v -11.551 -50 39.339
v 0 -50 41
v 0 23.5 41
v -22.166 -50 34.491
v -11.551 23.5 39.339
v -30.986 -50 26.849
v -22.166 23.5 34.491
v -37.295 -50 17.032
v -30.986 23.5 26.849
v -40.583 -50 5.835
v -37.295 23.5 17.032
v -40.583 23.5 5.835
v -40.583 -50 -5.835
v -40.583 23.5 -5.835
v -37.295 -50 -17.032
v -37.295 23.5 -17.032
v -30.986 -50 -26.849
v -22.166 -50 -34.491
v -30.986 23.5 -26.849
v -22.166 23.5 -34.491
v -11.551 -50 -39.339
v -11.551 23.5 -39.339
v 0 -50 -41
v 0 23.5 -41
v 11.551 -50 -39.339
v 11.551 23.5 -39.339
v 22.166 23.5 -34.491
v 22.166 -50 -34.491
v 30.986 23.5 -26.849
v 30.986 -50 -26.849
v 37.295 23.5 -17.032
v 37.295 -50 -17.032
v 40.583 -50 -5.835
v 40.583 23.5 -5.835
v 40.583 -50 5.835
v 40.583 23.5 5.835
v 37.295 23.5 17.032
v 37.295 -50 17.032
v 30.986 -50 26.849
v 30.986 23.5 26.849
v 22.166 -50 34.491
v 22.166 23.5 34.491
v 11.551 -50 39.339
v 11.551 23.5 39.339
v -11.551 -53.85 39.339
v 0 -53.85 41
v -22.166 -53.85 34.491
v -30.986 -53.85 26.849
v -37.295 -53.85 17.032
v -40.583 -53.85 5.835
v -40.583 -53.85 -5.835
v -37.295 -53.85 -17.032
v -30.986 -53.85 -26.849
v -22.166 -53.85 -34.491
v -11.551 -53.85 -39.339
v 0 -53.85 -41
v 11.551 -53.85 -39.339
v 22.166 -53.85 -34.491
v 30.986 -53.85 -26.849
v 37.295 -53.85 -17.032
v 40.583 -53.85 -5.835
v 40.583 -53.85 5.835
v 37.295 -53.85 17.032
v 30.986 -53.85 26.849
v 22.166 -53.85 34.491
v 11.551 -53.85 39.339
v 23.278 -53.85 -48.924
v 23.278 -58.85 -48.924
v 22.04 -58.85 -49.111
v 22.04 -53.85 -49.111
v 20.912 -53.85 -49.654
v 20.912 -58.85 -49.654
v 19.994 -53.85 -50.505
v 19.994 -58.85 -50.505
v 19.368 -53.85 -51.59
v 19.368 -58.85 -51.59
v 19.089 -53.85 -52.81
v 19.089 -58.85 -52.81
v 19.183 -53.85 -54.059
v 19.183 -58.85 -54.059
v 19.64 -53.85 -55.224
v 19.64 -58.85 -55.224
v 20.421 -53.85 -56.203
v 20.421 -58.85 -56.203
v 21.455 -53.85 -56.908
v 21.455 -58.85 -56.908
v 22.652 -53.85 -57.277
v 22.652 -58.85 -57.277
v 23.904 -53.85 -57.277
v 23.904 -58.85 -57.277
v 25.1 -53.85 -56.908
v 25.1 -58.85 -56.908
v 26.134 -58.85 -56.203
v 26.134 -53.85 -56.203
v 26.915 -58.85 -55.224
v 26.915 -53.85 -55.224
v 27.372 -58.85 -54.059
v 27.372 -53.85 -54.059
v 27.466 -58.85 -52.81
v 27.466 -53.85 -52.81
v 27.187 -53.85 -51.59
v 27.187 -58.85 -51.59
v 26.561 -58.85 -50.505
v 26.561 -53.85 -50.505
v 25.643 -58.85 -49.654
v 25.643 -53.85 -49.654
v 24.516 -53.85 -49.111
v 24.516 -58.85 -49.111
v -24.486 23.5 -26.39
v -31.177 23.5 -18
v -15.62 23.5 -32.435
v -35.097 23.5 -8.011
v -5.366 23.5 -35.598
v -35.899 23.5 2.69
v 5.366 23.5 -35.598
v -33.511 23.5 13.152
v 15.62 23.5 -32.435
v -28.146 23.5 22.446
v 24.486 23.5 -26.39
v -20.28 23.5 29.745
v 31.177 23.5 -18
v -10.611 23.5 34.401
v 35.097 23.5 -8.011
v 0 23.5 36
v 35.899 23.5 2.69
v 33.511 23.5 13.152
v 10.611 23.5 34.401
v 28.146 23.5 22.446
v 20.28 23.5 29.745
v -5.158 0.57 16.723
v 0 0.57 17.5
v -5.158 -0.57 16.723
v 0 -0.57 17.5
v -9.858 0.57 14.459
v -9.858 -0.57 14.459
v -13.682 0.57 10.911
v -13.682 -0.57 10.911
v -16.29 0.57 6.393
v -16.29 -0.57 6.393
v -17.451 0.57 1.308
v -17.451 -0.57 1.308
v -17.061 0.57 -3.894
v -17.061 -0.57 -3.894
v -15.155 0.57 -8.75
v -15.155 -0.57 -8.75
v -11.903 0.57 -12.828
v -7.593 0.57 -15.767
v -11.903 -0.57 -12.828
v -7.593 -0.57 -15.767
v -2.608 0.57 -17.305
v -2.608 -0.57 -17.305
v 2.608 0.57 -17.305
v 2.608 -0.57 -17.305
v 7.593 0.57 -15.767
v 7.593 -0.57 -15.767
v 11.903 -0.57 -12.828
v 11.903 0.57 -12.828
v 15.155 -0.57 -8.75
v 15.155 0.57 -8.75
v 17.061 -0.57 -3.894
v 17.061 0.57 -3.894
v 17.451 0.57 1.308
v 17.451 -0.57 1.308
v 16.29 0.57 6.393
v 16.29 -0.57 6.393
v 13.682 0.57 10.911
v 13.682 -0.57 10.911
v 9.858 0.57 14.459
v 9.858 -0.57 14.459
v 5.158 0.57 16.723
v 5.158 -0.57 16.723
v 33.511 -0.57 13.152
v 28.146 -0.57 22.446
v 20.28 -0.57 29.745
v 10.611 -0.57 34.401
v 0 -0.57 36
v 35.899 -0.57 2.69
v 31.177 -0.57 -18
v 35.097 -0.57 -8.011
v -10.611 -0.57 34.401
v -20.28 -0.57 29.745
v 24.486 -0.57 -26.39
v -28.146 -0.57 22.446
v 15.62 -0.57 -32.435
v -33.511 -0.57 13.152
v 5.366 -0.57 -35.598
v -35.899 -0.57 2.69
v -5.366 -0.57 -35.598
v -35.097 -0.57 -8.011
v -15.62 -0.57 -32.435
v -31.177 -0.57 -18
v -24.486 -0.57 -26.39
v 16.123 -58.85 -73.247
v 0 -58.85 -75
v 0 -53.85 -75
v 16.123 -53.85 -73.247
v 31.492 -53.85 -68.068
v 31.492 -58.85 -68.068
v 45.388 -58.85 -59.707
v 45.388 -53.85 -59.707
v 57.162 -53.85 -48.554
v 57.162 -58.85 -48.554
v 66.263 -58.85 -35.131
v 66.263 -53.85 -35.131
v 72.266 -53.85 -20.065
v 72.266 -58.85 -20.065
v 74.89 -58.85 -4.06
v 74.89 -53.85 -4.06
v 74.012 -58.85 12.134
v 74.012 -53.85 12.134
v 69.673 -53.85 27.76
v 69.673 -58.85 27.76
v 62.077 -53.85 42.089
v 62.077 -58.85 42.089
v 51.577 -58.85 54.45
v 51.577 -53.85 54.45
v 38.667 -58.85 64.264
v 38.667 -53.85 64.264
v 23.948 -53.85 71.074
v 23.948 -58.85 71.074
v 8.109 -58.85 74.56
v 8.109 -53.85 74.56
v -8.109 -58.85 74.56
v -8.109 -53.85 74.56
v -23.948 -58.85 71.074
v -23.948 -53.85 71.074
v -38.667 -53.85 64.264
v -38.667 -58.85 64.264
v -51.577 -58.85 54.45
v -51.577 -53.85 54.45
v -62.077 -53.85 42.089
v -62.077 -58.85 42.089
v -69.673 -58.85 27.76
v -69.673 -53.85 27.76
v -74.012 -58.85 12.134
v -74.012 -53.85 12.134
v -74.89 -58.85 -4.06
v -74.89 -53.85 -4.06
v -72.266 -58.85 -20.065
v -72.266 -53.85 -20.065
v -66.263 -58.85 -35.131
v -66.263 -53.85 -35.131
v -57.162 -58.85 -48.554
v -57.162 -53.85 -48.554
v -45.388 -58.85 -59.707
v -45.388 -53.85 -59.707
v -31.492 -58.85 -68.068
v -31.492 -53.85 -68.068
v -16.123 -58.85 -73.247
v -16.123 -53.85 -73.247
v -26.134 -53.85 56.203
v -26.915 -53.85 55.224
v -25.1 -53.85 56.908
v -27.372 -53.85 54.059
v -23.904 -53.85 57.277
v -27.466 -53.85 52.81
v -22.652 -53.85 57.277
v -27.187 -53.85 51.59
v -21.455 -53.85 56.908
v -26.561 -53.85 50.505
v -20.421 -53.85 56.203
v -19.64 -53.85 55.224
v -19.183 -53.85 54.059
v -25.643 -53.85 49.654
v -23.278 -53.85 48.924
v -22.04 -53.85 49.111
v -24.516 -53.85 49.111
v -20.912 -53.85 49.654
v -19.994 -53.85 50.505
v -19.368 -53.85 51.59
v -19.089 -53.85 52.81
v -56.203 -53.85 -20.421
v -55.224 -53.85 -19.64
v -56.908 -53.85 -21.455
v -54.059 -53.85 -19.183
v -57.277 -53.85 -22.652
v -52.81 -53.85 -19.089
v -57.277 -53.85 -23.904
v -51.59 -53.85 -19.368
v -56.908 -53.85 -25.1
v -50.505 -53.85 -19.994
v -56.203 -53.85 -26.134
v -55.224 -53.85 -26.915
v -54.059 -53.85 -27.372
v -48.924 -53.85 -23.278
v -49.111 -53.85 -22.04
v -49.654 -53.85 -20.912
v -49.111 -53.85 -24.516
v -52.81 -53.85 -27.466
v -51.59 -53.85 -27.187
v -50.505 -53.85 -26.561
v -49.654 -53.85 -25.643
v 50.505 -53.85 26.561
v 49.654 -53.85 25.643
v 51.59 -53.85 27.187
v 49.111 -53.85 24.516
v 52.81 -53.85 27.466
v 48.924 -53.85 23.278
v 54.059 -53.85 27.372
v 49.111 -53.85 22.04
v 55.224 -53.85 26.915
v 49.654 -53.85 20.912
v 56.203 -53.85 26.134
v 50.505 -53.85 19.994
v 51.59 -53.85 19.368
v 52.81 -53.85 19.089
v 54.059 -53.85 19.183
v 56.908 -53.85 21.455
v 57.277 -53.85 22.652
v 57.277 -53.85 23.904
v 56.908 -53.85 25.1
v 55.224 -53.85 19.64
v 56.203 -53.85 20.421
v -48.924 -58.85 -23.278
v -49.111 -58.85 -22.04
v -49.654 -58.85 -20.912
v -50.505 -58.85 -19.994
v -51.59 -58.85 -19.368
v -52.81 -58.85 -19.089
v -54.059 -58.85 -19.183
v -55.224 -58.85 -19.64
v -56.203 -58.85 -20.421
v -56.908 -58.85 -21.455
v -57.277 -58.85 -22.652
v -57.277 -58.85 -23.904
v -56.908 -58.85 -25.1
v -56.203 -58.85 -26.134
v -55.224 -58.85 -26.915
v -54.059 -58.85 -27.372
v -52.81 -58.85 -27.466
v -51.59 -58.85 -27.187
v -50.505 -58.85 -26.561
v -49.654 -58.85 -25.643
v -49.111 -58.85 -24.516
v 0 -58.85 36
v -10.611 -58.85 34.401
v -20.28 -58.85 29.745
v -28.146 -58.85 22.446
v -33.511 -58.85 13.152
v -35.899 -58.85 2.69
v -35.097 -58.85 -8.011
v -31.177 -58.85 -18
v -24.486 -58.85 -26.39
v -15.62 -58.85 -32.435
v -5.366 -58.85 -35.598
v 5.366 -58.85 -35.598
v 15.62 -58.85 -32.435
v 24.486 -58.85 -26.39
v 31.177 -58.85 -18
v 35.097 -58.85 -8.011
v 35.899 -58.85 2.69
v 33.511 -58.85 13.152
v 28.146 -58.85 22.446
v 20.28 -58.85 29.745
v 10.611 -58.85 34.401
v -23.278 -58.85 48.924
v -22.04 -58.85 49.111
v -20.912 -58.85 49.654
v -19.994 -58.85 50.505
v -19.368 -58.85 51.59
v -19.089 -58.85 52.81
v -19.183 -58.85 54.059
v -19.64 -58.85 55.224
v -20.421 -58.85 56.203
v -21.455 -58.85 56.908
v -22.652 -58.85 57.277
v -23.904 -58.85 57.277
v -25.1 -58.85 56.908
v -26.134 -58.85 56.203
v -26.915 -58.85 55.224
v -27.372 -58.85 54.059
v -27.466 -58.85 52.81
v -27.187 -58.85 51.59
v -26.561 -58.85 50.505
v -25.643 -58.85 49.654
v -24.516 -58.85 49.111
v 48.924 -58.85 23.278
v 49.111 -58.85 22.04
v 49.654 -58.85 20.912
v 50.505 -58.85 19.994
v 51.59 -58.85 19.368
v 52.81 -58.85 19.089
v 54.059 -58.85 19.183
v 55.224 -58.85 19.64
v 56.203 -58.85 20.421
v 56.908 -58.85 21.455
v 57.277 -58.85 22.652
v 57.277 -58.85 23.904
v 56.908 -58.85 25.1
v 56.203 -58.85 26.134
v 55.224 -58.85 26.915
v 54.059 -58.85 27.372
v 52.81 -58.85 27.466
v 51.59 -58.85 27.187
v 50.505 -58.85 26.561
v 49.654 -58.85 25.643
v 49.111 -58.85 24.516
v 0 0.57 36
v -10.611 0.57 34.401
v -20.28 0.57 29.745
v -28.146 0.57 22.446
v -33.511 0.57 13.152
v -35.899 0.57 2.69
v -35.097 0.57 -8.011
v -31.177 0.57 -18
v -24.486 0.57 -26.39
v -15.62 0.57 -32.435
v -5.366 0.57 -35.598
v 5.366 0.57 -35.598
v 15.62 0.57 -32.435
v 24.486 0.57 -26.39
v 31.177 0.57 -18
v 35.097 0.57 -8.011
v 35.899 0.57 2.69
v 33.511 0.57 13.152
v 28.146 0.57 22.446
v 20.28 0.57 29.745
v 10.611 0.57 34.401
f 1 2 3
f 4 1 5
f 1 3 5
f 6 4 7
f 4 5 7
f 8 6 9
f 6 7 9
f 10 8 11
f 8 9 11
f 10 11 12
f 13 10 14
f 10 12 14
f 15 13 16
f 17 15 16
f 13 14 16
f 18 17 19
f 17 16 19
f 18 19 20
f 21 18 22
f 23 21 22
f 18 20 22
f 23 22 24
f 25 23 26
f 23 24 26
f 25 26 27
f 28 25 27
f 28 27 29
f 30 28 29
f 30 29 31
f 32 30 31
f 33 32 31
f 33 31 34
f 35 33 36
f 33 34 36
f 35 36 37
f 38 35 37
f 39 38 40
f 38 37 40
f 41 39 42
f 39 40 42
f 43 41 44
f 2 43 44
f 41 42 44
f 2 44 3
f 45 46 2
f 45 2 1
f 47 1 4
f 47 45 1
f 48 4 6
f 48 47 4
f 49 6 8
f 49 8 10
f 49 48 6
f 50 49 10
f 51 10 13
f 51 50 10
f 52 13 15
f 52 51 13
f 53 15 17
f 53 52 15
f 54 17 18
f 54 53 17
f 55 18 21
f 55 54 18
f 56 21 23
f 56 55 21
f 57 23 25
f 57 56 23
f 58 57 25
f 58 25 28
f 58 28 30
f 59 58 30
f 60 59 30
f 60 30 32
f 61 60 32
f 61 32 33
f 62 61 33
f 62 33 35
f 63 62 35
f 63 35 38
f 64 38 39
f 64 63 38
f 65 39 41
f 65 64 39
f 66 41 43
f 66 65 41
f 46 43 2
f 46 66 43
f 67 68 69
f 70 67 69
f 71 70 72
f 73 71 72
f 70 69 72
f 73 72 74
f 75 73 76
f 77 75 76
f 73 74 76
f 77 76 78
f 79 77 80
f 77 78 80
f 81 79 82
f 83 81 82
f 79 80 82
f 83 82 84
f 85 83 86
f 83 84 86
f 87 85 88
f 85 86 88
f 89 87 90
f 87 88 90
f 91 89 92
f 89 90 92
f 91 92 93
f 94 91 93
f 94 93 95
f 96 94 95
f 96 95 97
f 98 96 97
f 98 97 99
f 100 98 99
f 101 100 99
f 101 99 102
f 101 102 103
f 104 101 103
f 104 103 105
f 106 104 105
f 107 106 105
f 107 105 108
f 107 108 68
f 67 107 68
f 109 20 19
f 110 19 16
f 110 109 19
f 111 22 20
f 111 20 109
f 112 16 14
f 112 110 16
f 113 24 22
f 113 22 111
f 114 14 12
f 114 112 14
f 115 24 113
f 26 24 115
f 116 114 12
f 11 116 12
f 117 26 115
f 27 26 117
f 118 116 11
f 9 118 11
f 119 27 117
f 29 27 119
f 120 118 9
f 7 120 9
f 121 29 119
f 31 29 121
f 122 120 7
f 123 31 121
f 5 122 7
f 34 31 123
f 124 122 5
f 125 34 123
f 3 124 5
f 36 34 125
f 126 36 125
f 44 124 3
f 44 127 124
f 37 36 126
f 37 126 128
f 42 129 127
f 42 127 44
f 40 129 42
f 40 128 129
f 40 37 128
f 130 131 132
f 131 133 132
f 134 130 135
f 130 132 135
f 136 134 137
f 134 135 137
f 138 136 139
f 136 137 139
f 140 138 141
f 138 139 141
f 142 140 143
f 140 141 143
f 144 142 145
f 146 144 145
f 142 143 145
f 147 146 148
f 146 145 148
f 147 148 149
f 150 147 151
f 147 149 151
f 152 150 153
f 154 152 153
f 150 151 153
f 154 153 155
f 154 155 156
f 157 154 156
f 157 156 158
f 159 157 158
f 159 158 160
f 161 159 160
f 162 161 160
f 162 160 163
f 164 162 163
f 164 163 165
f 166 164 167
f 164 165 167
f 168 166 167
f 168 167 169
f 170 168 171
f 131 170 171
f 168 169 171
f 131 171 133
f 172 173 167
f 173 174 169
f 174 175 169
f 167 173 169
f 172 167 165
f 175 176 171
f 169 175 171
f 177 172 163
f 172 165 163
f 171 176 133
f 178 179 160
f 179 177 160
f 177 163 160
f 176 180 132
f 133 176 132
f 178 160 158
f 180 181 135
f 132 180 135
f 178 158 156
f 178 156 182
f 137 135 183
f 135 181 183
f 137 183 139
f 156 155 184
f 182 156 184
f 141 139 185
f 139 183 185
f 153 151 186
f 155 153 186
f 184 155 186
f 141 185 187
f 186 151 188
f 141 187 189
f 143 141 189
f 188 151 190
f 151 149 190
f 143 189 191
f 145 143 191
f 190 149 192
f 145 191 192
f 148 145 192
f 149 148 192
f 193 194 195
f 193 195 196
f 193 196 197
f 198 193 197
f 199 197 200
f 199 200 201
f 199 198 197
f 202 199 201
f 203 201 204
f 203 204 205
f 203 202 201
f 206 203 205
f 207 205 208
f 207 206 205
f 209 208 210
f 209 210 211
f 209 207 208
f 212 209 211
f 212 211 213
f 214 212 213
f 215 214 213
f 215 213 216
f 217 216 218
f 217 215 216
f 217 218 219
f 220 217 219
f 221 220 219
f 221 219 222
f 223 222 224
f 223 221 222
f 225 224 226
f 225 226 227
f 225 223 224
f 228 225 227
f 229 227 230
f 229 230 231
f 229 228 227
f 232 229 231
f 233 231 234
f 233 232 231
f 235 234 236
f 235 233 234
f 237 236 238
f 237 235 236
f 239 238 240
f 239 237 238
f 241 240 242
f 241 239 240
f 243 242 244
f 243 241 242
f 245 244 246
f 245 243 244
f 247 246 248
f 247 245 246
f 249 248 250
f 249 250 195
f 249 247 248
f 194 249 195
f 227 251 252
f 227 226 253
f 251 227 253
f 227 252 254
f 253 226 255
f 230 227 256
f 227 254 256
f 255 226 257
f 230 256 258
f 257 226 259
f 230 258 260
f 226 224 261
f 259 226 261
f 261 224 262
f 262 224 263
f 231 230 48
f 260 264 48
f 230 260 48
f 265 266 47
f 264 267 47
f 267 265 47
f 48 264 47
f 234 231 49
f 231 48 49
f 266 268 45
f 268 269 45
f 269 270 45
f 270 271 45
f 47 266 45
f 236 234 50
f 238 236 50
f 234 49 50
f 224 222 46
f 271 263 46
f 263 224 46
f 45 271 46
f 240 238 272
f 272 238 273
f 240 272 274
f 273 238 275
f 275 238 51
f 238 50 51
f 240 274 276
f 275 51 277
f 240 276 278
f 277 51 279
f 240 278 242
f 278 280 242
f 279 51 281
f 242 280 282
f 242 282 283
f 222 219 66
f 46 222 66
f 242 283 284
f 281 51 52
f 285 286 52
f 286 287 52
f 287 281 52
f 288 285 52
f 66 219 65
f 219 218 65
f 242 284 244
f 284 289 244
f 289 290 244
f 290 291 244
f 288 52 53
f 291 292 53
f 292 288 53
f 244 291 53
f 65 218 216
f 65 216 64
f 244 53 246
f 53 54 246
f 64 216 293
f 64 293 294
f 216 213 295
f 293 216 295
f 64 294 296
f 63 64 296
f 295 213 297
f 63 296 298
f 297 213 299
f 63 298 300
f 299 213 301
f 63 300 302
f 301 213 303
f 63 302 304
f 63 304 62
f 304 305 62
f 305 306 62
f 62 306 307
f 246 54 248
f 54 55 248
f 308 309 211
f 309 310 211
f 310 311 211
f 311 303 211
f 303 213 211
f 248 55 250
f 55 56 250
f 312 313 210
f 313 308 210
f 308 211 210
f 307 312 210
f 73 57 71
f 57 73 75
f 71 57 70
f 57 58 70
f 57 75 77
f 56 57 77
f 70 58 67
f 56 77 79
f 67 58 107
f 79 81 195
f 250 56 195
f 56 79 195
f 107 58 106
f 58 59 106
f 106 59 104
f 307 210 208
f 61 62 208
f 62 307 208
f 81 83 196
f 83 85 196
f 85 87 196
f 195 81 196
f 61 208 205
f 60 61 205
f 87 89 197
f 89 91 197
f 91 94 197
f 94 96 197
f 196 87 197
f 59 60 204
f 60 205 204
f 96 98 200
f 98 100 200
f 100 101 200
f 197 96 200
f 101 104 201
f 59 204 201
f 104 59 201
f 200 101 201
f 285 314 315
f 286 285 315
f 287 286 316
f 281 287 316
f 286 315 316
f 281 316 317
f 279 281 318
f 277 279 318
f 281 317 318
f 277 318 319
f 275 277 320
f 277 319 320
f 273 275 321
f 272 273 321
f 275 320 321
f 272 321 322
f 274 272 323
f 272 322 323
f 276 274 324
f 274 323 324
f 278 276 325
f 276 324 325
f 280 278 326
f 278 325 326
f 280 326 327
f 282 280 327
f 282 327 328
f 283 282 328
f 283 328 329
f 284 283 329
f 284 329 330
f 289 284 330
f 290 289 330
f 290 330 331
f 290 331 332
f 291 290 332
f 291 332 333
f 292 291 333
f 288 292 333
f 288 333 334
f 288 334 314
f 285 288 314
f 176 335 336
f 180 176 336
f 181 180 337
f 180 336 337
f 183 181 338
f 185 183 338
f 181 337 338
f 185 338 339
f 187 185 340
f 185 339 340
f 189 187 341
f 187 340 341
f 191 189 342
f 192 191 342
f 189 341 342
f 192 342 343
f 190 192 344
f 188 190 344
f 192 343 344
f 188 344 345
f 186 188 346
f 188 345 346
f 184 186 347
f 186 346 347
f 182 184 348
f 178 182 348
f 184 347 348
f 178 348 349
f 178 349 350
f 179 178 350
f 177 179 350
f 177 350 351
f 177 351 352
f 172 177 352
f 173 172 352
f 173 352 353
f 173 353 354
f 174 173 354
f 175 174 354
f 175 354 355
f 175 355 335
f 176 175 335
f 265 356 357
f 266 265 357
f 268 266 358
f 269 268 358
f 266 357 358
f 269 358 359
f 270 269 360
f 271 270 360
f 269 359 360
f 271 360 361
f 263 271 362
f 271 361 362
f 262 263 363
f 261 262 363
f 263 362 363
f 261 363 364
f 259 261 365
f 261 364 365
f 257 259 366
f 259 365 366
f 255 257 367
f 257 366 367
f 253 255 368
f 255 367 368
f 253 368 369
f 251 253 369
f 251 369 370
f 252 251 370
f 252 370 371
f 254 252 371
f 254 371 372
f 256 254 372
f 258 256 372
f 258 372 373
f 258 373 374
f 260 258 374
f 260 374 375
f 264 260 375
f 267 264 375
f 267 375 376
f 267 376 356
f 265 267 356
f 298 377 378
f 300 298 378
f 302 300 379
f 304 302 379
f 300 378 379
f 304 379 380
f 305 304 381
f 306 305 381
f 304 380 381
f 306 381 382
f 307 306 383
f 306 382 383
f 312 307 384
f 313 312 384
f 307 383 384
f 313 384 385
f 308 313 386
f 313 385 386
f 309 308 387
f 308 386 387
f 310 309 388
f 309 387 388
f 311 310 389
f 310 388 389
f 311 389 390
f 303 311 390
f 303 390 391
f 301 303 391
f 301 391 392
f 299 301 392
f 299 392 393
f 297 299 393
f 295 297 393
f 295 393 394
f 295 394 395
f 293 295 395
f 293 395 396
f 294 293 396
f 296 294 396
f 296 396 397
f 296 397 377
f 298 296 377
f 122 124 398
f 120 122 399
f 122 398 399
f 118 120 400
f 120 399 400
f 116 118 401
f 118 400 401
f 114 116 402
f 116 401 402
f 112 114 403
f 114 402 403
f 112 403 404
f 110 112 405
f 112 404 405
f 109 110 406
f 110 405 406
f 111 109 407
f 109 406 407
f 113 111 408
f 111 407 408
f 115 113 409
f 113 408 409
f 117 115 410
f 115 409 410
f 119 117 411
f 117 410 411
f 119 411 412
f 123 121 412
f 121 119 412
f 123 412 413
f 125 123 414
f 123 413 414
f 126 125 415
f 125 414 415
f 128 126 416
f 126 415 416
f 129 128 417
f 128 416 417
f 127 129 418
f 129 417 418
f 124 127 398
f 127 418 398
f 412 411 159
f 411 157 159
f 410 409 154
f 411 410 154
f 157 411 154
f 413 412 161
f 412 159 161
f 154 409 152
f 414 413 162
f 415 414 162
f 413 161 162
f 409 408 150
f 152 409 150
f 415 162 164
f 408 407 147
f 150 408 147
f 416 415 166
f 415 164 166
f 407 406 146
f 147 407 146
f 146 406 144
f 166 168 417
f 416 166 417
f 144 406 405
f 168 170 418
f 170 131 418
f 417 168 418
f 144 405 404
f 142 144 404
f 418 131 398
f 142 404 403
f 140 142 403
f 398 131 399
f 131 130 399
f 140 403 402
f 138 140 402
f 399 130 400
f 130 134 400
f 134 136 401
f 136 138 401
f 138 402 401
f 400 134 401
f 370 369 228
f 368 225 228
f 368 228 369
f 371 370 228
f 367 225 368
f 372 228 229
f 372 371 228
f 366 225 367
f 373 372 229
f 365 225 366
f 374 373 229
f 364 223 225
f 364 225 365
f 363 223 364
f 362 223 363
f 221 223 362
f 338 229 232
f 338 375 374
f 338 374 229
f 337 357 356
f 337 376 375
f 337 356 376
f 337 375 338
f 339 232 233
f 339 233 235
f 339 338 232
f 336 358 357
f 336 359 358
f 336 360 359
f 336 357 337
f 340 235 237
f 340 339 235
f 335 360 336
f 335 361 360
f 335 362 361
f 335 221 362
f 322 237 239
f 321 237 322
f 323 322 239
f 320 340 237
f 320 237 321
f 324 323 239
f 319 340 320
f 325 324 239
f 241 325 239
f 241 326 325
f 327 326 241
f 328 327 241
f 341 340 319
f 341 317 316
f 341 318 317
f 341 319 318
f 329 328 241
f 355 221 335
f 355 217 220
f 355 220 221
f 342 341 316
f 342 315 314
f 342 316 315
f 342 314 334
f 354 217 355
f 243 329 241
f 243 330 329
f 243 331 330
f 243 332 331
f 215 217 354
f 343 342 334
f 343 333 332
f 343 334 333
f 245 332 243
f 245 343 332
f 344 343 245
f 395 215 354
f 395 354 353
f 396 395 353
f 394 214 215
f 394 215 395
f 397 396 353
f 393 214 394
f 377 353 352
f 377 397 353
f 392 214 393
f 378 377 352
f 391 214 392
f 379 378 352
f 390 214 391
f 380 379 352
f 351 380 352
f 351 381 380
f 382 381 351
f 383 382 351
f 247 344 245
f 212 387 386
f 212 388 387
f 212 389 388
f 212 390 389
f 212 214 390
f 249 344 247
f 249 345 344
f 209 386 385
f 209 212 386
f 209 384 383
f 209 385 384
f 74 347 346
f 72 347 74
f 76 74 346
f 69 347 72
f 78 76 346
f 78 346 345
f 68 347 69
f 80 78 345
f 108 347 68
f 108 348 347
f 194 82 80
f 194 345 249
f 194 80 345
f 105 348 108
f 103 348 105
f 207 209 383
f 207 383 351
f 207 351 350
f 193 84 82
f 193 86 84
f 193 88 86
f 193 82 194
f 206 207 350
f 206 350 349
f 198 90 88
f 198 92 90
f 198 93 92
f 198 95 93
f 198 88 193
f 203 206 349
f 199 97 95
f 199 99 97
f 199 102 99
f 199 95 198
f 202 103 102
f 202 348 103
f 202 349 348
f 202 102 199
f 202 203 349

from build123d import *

# Parameters (mm, degrees)
BOSS_EXTRU_1_START           = 3.85
ESQUISSE2_R                  = 41
ESQUISSE2_R_2                = 36
BOSS_EXTRU_1_DEPTH           = 3.85
ENL_V_START                  = -26.5
ESQUISSE4_R                  = 41
ESQUISSE4_R_2                = 36
ENL_V_MAT_EXTRU_2_DEPTH      = 26.5
BOSS_EXTRU_2_START           = 5
ESQUISSE5_R                  = 75
ESQUISSE5_R_2                = 36
BOSS_EXTRU_2_DEPTH           = 5
D_GAGEMENT_M81_D             = 8.4
R_P_TITION_CIRCULAIRE1_COUNT = 4


with BuildPart() as part:
    # Esquisse1 → Révolution1 (revolve)
    with BuildSketch(Plane.XY, mode=Mode.PRIVATE) as r_volution1_sk:
        Polygon((-17.5, 0.57), (-17.5, -0.57), (-36, -0.57), (-36, -50), (-41, -50), (-41, 50), (-36, 50), (-36, 0.57), align=None)
    revolve(r_volution1_sk.sketch.rotate(Axis((0, 7.711117165, 0), (0, -1, 0)), 270), axis=Axis((0, 7.711117165, 0), (0, -1, 0)))

    # Esquisse2 → Boss.-Extru.1 (add)
    with BuildSketch(Plane.XZ.offset(50).offset(BOSS_EXTRU_1_START)):
        with Locations(Location((0, 0, 0), (0, 0, 90))):
            Circle(ESQUISSE2_R)
        with Locations(Location((0, 0, 0), (0, 0, 90))):
            Circle(ESQUISSE2_R_2, mode=Mode.SUBTRACT)
    extrude(amount=-BOSS_EXTRU_1_DEPTH)

    # Esquisse4 → Enlèv. mat.-Extru.2 (cut)
    with BuildSketch(Plane(origin=(0, 50, 0), x_dir=(1, 0, 0), z_dir=(0, 1, 0)).offset(ENL_V_START)):
        with Locations(Location((0, 0, 0), (0, 0, 270))):
            Circle(ESQUISSE4_R)
        with Locations(Location((0, 0, 0), (0, 0, 270))):
            Circle(ESQUISSE4_R_2, mode=Mode.SUBTRACT)
    extrude(amount=ENL_V_MAT_EXTRU_2_DEPTH, mode=Mode.SUBTRACT)

    # Esquisse5 → Boss.-Extru.2 (add)
    with BuildSketch(Plane.XZ.offset(53.85).offset(BOSS_EXTRU_2_START)):
        with Locations(Location((0, 0, 0), (0, 0, 270))):
            Circle(ESQUISSE5_R)
        with Locations(Location((0, 0, 0), (0, 0, 90))):
            Circle(ESQUISSE5_R_2, mode=Mode.SUBTRACT)
    extrude(amount=-BOSS_EXTRU_2_DEPTH)

    # Dégagement M81 (through all)
    with Locations(Plane(origin=(0, -53.85, 0), x_dir=(1, 0, 0), z_dir=(0, 1, 0))):
        with Locations((53.123973782, -23.277530145)):
            d_gagement_m81 = Hole(D_GAGEMENT_M81_D / 2)

    # Répétition circulaire1: Dégagement M81 ×4 about axis
    r_p_tition_circulaire1_axis = Axis((0, 0, 0), (0, 1, 0))
    for i in range(1, R_P_TITION_CIRCULAIRE1_COUNT):
        add(d_gagement_m81.rotate(r_p_tition_circulaire1_axis, i * 360 / R_P_TITION_CIRCULAIRE1_COUNT), mode=Mode.SUBTRACT)


solid = part.part
